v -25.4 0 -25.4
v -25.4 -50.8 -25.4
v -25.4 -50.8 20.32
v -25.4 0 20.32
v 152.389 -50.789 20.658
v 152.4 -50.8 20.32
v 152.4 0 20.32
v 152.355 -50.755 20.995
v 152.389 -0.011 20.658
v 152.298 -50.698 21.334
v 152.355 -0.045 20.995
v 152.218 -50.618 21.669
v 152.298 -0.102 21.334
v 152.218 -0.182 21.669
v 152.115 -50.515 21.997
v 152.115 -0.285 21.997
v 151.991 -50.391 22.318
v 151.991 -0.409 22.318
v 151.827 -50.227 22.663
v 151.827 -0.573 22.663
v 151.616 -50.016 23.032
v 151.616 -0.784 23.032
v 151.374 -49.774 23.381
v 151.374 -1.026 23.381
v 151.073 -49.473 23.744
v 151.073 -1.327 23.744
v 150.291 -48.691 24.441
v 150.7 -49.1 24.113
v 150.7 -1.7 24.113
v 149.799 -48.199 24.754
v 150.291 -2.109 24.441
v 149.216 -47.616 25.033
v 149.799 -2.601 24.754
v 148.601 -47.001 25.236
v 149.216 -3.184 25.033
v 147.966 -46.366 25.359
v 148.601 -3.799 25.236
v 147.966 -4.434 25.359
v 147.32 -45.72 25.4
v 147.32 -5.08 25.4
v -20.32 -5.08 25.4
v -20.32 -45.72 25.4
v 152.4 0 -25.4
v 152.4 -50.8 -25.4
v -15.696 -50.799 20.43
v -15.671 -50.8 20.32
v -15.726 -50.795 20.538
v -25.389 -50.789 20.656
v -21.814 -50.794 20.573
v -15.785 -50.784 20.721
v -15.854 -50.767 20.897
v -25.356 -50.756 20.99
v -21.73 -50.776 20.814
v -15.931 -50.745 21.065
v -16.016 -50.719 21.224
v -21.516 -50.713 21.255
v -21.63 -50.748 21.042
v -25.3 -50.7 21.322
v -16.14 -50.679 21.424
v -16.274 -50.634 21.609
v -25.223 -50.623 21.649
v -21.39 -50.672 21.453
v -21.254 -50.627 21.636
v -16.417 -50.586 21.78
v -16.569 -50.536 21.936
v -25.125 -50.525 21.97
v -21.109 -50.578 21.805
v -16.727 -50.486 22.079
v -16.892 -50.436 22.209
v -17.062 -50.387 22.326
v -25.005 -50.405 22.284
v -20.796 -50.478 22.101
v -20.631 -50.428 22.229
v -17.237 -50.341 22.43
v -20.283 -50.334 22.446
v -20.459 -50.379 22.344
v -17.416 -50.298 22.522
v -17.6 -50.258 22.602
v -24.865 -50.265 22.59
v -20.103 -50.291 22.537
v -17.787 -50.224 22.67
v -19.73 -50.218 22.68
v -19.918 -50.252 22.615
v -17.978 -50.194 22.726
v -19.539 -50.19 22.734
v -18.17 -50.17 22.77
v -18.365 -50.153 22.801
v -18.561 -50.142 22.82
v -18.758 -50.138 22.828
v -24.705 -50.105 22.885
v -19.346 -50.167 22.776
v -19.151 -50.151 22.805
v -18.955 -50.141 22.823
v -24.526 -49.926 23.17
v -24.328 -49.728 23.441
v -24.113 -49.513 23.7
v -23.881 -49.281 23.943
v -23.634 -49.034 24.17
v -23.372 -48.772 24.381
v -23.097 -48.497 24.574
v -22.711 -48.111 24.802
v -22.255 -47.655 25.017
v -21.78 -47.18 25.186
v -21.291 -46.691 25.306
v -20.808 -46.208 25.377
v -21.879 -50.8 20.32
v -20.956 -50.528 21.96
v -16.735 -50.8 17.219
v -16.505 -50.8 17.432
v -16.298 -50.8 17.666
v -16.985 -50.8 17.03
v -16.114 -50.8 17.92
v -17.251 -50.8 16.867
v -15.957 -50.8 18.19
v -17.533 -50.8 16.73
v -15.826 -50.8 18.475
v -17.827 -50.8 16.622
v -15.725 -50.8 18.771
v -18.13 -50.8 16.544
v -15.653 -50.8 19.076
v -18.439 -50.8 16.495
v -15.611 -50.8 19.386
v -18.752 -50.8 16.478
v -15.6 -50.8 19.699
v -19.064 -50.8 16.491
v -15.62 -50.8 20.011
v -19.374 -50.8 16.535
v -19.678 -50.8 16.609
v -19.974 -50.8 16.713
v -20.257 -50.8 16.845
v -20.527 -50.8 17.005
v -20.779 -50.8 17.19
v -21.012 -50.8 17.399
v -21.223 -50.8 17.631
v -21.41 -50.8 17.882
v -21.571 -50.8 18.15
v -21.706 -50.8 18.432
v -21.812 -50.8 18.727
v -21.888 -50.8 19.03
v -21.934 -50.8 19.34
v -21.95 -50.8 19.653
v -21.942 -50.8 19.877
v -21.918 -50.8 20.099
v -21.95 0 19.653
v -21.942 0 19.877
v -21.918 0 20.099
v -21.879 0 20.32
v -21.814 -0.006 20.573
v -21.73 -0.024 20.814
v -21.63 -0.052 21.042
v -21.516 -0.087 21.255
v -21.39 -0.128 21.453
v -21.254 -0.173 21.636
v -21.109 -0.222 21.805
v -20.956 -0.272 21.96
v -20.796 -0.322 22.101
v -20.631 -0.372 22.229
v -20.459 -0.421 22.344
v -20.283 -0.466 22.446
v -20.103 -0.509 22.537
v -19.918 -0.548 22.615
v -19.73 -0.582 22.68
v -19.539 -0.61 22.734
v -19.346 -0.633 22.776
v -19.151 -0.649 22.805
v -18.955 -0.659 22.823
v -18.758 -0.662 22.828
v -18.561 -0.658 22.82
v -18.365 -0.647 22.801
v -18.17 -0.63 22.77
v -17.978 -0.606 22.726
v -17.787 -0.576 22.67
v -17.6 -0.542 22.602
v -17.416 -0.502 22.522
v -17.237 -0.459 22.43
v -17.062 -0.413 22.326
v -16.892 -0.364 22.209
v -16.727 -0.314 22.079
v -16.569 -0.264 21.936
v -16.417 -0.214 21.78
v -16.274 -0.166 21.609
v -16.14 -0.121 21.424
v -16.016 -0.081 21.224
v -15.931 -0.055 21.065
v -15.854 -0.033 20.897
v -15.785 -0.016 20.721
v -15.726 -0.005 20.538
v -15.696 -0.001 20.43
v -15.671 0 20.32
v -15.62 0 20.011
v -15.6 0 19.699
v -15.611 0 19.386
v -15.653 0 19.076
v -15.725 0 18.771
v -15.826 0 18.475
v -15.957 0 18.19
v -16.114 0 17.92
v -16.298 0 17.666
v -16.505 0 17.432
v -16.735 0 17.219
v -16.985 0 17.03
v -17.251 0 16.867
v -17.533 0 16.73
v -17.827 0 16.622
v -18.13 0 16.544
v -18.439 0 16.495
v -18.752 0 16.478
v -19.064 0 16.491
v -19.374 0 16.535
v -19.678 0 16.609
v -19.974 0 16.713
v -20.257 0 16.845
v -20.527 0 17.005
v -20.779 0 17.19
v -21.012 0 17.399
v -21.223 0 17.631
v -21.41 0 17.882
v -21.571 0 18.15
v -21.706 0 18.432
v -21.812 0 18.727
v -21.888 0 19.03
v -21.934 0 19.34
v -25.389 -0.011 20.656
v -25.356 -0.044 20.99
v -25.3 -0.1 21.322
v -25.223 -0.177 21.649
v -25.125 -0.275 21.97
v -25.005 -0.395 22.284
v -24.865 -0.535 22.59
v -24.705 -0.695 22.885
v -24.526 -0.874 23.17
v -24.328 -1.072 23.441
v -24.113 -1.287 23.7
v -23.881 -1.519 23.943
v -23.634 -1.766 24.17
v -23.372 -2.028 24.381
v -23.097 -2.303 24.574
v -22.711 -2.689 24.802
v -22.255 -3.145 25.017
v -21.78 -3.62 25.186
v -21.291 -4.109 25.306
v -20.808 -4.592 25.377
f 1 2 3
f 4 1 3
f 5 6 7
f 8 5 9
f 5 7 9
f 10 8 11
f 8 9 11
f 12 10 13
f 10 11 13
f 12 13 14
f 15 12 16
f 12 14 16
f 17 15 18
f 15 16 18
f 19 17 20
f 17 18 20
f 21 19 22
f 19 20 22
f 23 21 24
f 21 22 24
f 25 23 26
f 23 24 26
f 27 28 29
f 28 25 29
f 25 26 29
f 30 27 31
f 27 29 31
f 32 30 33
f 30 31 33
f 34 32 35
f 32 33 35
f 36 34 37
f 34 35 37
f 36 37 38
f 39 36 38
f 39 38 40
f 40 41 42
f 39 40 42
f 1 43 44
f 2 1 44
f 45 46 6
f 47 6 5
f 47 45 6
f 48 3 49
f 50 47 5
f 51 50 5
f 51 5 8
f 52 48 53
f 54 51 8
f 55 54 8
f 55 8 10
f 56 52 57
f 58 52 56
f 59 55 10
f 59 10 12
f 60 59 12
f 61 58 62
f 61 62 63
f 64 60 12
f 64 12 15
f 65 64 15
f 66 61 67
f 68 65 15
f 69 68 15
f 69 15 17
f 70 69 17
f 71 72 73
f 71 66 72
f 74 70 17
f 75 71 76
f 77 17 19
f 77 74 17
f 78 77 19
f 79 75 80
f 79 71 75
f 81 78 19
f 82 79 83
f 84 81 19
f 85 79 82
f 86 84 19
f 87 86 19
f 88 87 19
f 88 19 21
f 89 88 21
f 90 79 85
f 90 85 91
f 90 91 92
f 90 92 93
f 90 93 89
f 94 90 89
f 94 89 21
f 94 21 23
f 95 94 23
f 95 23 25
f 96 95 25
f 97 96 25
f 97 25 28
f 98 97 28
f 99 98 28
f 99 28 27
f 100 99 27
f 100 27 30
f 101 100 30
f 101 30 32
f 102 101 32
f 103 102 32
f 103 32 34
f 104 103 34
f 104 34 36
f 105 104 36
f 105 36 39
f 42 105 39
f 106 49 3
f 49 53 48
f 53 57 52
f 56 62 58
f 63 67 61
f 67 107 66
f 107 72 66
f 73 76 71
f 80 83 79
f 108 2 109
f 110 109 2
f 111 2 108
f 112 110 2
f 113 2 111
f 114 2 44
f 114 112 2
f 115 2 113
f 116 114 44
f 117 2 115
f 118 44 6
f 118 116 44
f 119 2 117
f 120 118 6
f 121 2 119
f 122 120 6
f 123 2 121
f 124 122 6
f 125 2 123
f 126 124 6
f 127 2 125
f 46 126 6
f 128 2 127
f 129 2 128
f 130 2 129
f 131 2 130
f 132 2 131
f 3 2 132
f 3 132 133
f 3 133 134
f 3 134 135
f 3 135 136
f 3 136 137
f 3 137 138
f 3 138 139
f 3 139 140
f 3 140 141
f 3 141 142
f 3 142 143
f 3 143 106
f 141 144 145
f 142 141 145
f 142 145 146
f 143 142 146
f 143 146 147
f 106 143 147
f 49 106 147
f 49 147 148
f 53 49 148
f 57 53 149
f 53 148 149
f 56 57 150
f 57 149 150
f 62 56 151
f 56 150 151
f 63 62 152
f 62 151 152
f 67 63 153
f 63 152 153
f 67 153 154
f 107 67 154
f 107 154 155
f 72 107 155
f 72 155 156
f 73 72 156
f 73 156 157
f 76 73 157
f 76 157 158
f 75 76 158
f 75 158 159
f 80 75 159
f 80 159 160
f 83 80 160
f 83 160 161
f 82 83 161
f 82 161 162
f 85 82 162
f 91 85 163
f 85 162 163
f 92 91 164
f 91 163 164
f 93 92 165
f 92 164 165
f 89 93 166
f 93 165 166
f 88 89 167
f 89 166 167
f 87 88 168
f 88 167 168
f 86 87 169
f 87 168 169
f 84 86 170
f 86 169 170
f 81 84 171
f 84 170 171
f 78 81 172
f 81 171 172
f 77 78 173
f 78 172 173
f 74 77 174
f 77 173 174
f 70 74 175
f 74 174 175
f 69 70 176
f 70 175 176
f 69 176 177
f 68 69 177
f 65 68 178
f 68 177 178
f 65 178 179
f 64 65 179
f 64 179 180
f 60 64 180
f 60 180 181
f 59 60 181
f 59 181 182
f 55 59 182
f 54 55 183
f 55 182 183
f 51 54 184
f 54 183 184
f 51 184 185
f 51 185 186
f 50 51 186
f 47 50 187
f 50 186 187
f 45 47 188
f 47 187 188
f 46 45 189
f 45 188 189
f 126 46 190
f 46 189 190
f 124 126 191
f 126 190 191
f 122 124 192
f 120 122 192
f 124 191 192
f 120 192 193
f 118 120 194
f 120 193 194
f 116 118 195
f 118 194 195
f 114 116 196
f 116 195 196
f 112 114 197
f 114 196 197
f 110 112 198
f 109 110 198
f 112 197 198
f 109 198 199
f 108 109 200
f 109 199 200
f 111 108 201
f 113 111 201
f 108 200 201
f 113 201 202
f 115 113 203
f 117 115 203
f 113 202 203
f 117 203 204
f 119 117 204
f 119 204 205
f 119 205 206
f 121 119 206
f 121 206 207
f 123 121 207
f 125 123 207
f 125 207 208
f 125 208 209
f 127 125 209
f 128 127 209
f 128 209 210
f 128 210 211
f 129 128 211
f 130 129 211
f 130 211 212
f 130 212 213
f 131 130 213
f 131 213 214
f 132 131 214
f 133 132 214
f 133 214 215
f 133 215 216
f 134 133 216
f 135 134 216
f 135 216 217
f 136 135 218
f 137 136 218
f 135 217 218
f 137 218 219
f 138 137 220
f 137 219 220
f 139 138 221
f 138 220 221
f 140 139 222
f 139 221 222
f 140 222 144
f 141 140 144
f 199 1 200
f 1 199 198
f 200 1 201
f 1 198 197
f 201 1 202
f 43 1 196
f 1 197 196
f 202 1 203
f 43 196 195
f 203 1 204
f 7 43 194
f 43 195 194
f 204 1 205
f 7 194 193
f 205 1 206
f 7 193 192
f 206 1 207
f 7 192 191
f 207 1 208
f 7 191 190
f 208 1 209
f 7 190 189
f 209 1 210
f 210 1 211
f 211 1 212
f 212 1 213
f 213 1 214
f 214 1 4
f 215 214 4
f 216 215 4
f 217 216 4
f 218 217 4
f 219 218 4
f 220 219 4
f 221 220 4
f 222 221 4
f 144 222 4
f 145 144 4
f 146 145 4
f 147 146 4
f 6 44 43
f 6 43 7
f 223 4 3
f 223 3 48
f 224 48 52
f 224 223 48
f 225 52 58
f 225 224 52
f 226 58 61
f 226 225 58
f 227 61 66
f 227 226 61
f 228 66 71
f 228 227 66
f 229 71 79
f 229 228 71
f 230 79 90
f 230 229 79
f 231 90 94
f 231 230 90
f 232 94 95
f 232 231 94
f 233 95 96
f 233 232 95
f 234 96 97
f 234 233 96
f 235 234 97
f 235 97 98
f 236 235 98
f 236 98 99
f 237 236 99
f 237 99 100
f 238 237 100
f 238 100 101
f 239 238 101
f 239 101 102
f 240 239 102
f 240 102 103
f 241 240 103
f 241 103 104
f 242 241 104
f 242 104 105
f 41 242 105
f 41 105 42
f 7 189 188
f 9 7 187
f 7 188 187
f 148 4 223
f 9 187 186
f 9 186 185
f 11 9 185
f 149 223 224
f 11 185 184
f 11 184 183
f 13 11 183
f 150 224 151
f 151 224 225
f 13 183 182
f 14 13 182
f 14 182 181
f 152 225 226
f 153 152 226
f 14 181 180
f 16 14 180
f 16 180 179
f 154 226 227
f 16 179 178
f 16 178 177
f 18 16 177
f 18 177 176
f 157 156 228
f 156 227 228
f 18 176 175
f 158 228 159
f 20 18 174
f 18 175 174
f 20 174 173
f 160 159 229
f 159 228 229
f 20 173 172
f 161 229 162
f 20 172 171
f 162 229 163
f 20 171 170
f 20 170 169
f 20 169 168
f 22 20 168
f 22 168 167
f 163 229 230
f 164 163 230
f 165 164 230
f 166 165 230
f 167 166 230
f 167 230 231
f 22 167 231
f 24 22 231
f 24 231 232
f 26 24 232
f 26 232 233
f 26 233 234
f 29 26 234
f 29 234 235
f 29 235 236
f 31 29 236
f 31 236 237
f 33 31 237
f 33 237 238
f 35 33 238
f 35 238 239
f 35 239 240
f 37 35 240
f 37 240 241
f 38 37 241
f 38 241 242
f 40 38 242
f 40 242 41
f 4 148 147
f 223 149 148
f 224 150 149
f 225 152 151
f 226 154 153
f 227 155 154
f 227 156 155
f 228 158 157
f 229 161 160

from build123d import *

# Parameters (mm, degrees)
F0_W        = 50.8
F0_H        = 50.8
F1_DEPTH    = 50.8
F2_DEPTH    = 127
F4_D        = 6.35
F5_T1_DEPTH = 76.2
F5_T3_DEPTH = 203.2


# Not quite as in the source:
# - a fillet or chamfer that OpenCascade refuses, or shapes differently, is made with other operations: its cross-section is extruded or revolved along the edge and cut away or added


with BuildPart() as f1:
    # F0 (on Front) → F1 (new body)
    with BuildSketch(Plane.XZ):
        Rectangle(F0_W, F0_H)
    extrude(amount=F1_DEPTH)

    # F2 (add): a face of the model
    f2_faces = [f1.faces().sort_by_distance(p)[0] for p in [
        (25.4, -25.4, 0),
    ]]
    extrude(f2_faces, amount=F2_DEPTH)

    # F4 (through all)
    with Locations(Plane.XZ.offset(50.8)):
        with Locations((-18.774760887, 19.6526572108)):
            Hole(F4_D / 2)

    # F5: fillet of radius 5.08 on 4 edges, made by hand

    # F5_s2 → F5_t1 (cut)
    with BuildSketch(Plane.XZ.offset(-12.7)):
        with BuildLine():
            ThreePointArc((-25.4, 20.32), (-23.9121024484, 23.9121024484), (-20.32, 25.4))
            Line((-20.32, 25.4), (-25.4, 25.4))
            Line((-25.4, 25.4), (-25.4, 20.32))
        make_face()
        with BuildLine():
            ThreePointArc((152.4, 20.32), (150.9121024484, 23.9121024484), (147.32, 25.4))
            Line((147.32, 25.4), (152.4, 25.4))
            Line((152.4, 25.4), (152.4, 20.32))
        make_face()
    extrude(amount=F5_T1_DEPTH, mode=Mode.SUBTRACT)

    # F5_s4 → F5_t3 (cut)
    with BuildSketch(Plane.YZ.offset(-38.1)):
        with BuildLine():
            ThreePointArc((0, 20.32), (-1.4878975516, 23.9121024484), (-5.08, 25.4))
            Line((-5.08, 25.4), (0, 25.4))
            Line((0, 25.4), (0, 20.32))
        make_face()
        with BuildLine():
            ThreePointArc((-50.8, 20.32), (-49.3121024484, 23.9121024484), (-45.72, 25.4))
            Line((-45.72, 25.4), (-50.8, 25.4))
            Line((-50.8, 25.4), (-50.8, 20.32))
        make_face()
    extrude(amount=F5_T3_DEPTH, mode=Mode.SUBTRACT)


solid = f1.part
